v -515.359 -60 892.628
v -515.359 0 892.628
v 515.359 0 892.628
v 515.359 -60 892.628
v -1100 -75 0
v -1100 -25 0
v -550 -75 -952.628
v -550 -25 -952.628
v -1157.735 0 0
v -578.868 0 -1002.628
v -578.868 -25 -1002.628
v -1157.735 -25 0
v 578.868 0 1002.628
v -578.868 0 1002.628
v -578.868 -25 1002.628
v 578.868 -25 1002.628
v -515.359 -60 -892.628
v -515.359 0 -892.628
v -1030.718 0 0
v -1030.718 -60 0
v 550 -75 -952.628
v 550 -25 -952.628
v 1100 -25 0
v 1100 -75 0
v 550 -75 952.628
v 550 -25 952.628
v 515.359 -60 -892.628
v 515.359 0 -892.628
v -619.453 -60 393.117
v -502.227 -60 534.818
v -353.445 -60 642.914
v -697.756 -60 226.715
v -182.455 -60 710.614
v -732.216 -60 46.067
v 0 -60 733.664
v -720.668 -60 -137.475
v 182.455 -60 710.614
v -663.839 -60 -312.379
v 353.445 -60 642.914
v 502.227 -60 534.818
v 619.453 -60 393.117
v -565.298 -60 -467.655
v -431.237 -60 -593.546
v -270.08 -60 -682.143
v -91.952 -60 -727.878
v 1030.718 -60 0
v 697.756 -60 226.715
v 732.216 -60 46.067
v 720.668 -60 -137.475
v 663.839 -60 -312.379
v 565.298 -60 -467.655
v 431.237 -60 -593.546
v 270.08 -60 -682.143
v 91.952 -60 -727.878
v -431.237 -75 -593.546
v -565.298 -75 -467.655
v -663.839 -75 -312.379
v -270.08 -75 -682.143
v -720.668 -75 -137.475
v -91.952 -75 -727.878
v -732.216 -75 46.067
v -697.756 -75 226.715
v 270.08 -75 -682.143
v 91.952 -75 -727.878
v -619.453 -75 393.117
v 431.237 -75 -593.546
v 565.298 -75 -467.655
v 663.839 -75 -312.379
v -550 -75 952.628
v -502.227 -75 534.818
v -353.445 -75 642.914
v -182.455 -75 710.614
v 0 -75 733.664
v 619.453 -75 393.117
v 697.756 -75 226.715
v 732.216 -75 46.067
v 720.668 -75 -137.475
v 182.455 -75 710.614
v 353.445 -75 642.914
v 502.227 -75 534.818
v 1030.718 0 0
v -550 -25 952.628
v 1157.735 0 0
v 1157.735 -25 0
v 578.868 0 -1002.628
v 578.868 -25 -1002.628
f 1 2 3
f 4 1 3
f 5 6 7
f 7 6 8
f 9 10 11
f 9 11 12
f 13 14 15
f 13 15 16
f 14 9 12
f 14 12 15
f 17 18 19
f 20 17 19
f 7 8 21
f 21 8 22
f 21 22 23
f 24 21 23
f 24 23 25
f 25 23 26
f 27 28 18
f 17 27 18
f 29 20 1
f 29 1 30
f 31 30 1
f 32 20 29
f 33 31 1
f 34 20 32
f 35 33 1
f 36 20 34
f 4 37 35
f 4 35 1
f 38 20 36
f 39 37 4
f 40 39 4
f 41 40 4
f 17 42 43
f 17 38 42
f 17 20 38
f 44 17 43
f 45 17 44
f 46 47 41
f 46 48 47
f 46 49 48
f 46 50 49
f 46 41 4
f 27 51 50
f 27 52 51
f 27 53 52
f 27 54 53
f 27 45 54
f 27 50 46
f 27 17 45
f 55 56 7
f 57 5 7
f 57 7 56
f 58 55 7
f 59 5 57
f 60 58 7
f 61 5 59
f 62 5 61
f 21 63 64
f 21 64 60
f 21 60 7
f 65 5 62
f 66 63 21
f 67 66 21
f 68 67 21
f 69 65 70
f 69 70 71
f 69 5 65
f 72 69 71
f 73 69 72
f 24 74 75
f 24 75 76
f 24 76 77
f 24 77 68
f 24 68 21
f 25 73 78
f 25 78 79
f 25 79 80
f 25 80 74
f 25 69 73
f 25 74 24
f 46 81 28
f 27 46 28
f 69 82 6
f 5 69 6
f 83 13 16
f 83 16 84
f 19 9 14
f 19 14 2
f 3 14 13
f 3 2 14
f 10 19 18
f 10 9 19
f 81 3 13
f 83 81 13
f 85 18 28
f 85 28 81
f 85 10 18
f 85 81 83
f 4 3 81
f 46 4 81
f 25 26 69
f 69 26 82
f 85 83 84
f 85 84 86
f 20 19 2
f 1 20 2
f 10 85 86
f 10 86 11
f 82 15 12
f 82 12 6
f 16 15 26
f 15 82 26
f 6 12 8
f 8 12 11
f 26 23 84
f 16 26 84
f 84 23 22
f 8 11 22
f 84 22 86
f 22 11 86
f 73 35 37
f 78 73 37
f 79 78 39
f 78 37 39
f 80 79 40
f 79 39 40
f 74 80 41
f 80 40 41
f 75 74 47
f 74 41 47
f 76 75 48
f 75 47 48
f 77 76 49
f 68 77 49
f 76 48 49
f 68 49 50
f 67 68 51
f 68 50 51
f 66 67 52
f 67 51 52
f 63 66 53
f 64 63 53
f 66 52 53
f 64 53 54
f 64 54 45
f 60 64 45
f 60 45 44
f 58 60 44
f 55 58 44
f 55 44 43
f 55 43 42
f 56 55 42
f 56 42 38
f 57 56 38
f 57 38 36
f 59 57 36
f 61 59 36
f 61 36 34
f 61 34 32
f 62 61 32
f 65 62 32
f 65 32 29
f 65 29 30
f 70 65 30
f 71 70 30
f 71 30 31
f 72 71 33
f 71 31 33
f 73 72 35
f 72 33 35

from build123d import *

# Parameters (mm, degrees)
BOSS_EXTRUDE1_DEPTH = 25
BOSS_EXTRUDE2_DEPTH = 50
CUT_EXTRUDE1_DEPTH  = 60
CUT_EXTRUDE2_REACH  = 1534.714
SKETCH5_R           = 733.663605778


with BuildPart() as part:
    # Sketch1 → Boss-Extrude1 (new body)
    with BuildSketch(Plane(origin=(0, 0, 0), x_dir=(1, 0, 0), z_dir=(0, 1, 0))):
        Polygon((-578.86751, 1002.627938171), (-1157.73502, 0), (-578.86751, -1002.627938171), (578.86751, -1002.627938171), (1157.73502, 0), (578.86751, 1002.627938171), align=None)
    extrude(amount=-BOSS_EXTRUDE1_DEPTH)

    # Sketch3 → Boss-Extrude2 (add)
    with BuildSketch(Plane.XZ.offset(25)):
        Polygon((-549.999996541, -952.627938171), (549.999996541, -952.627938171), (1099.999993081, 0), (549.999996541, 952.627938171), (-549.999996541, 952.627938171), (-1099.999993081, 0), align=None)
    extrude(amount=BOSS_EXTRUDE2_DEPTH)

    # Sketch4 → Cut-Extrude1 (cut)
    with BuildSketch(Plane(origin=(0, 0, 0), x_dir=(1, 0, 0), z_dir=(0, 1, 0))):
        Polygon((515.358980389, 892.627938171), (-515.358980389, 892.627938171), (-1030.717960778, 0), (-515.358980389, -892.627938171), (515.358980389, -892.627938171), (1030.717960778, 0), align=None)
    extrude(amount=-CUT_EXTRUDE1_DEPTH, mode=Mode.SUBTRACT)

    # Sketch5 → Cut-Extrude2 (cut, up to next)
    with BuildSketch(Plane(origin=(0, -60, 0), x_dir=(1, 0, 0), z_dir=(0, 1, 0)), mode=Mode.PRIVATE) as cut_extrude2_sk1:
        with Locations(Location((0, 0, 0), (0, 0, 270))):
            Circle(SKETCH5_R)
    cut_extrude2_tool1 = extrude(cut_extrude2_sk1.sketch, amount=-CUT_EXTRUDE2_REACH, mode=Mode.PRIVATE) & part.part
    add(cut_extrude2_tool1.solids().sort_by_distance((0, -60, 0))[0], mode=Mode.SUBTRACT)


solid = part.part
